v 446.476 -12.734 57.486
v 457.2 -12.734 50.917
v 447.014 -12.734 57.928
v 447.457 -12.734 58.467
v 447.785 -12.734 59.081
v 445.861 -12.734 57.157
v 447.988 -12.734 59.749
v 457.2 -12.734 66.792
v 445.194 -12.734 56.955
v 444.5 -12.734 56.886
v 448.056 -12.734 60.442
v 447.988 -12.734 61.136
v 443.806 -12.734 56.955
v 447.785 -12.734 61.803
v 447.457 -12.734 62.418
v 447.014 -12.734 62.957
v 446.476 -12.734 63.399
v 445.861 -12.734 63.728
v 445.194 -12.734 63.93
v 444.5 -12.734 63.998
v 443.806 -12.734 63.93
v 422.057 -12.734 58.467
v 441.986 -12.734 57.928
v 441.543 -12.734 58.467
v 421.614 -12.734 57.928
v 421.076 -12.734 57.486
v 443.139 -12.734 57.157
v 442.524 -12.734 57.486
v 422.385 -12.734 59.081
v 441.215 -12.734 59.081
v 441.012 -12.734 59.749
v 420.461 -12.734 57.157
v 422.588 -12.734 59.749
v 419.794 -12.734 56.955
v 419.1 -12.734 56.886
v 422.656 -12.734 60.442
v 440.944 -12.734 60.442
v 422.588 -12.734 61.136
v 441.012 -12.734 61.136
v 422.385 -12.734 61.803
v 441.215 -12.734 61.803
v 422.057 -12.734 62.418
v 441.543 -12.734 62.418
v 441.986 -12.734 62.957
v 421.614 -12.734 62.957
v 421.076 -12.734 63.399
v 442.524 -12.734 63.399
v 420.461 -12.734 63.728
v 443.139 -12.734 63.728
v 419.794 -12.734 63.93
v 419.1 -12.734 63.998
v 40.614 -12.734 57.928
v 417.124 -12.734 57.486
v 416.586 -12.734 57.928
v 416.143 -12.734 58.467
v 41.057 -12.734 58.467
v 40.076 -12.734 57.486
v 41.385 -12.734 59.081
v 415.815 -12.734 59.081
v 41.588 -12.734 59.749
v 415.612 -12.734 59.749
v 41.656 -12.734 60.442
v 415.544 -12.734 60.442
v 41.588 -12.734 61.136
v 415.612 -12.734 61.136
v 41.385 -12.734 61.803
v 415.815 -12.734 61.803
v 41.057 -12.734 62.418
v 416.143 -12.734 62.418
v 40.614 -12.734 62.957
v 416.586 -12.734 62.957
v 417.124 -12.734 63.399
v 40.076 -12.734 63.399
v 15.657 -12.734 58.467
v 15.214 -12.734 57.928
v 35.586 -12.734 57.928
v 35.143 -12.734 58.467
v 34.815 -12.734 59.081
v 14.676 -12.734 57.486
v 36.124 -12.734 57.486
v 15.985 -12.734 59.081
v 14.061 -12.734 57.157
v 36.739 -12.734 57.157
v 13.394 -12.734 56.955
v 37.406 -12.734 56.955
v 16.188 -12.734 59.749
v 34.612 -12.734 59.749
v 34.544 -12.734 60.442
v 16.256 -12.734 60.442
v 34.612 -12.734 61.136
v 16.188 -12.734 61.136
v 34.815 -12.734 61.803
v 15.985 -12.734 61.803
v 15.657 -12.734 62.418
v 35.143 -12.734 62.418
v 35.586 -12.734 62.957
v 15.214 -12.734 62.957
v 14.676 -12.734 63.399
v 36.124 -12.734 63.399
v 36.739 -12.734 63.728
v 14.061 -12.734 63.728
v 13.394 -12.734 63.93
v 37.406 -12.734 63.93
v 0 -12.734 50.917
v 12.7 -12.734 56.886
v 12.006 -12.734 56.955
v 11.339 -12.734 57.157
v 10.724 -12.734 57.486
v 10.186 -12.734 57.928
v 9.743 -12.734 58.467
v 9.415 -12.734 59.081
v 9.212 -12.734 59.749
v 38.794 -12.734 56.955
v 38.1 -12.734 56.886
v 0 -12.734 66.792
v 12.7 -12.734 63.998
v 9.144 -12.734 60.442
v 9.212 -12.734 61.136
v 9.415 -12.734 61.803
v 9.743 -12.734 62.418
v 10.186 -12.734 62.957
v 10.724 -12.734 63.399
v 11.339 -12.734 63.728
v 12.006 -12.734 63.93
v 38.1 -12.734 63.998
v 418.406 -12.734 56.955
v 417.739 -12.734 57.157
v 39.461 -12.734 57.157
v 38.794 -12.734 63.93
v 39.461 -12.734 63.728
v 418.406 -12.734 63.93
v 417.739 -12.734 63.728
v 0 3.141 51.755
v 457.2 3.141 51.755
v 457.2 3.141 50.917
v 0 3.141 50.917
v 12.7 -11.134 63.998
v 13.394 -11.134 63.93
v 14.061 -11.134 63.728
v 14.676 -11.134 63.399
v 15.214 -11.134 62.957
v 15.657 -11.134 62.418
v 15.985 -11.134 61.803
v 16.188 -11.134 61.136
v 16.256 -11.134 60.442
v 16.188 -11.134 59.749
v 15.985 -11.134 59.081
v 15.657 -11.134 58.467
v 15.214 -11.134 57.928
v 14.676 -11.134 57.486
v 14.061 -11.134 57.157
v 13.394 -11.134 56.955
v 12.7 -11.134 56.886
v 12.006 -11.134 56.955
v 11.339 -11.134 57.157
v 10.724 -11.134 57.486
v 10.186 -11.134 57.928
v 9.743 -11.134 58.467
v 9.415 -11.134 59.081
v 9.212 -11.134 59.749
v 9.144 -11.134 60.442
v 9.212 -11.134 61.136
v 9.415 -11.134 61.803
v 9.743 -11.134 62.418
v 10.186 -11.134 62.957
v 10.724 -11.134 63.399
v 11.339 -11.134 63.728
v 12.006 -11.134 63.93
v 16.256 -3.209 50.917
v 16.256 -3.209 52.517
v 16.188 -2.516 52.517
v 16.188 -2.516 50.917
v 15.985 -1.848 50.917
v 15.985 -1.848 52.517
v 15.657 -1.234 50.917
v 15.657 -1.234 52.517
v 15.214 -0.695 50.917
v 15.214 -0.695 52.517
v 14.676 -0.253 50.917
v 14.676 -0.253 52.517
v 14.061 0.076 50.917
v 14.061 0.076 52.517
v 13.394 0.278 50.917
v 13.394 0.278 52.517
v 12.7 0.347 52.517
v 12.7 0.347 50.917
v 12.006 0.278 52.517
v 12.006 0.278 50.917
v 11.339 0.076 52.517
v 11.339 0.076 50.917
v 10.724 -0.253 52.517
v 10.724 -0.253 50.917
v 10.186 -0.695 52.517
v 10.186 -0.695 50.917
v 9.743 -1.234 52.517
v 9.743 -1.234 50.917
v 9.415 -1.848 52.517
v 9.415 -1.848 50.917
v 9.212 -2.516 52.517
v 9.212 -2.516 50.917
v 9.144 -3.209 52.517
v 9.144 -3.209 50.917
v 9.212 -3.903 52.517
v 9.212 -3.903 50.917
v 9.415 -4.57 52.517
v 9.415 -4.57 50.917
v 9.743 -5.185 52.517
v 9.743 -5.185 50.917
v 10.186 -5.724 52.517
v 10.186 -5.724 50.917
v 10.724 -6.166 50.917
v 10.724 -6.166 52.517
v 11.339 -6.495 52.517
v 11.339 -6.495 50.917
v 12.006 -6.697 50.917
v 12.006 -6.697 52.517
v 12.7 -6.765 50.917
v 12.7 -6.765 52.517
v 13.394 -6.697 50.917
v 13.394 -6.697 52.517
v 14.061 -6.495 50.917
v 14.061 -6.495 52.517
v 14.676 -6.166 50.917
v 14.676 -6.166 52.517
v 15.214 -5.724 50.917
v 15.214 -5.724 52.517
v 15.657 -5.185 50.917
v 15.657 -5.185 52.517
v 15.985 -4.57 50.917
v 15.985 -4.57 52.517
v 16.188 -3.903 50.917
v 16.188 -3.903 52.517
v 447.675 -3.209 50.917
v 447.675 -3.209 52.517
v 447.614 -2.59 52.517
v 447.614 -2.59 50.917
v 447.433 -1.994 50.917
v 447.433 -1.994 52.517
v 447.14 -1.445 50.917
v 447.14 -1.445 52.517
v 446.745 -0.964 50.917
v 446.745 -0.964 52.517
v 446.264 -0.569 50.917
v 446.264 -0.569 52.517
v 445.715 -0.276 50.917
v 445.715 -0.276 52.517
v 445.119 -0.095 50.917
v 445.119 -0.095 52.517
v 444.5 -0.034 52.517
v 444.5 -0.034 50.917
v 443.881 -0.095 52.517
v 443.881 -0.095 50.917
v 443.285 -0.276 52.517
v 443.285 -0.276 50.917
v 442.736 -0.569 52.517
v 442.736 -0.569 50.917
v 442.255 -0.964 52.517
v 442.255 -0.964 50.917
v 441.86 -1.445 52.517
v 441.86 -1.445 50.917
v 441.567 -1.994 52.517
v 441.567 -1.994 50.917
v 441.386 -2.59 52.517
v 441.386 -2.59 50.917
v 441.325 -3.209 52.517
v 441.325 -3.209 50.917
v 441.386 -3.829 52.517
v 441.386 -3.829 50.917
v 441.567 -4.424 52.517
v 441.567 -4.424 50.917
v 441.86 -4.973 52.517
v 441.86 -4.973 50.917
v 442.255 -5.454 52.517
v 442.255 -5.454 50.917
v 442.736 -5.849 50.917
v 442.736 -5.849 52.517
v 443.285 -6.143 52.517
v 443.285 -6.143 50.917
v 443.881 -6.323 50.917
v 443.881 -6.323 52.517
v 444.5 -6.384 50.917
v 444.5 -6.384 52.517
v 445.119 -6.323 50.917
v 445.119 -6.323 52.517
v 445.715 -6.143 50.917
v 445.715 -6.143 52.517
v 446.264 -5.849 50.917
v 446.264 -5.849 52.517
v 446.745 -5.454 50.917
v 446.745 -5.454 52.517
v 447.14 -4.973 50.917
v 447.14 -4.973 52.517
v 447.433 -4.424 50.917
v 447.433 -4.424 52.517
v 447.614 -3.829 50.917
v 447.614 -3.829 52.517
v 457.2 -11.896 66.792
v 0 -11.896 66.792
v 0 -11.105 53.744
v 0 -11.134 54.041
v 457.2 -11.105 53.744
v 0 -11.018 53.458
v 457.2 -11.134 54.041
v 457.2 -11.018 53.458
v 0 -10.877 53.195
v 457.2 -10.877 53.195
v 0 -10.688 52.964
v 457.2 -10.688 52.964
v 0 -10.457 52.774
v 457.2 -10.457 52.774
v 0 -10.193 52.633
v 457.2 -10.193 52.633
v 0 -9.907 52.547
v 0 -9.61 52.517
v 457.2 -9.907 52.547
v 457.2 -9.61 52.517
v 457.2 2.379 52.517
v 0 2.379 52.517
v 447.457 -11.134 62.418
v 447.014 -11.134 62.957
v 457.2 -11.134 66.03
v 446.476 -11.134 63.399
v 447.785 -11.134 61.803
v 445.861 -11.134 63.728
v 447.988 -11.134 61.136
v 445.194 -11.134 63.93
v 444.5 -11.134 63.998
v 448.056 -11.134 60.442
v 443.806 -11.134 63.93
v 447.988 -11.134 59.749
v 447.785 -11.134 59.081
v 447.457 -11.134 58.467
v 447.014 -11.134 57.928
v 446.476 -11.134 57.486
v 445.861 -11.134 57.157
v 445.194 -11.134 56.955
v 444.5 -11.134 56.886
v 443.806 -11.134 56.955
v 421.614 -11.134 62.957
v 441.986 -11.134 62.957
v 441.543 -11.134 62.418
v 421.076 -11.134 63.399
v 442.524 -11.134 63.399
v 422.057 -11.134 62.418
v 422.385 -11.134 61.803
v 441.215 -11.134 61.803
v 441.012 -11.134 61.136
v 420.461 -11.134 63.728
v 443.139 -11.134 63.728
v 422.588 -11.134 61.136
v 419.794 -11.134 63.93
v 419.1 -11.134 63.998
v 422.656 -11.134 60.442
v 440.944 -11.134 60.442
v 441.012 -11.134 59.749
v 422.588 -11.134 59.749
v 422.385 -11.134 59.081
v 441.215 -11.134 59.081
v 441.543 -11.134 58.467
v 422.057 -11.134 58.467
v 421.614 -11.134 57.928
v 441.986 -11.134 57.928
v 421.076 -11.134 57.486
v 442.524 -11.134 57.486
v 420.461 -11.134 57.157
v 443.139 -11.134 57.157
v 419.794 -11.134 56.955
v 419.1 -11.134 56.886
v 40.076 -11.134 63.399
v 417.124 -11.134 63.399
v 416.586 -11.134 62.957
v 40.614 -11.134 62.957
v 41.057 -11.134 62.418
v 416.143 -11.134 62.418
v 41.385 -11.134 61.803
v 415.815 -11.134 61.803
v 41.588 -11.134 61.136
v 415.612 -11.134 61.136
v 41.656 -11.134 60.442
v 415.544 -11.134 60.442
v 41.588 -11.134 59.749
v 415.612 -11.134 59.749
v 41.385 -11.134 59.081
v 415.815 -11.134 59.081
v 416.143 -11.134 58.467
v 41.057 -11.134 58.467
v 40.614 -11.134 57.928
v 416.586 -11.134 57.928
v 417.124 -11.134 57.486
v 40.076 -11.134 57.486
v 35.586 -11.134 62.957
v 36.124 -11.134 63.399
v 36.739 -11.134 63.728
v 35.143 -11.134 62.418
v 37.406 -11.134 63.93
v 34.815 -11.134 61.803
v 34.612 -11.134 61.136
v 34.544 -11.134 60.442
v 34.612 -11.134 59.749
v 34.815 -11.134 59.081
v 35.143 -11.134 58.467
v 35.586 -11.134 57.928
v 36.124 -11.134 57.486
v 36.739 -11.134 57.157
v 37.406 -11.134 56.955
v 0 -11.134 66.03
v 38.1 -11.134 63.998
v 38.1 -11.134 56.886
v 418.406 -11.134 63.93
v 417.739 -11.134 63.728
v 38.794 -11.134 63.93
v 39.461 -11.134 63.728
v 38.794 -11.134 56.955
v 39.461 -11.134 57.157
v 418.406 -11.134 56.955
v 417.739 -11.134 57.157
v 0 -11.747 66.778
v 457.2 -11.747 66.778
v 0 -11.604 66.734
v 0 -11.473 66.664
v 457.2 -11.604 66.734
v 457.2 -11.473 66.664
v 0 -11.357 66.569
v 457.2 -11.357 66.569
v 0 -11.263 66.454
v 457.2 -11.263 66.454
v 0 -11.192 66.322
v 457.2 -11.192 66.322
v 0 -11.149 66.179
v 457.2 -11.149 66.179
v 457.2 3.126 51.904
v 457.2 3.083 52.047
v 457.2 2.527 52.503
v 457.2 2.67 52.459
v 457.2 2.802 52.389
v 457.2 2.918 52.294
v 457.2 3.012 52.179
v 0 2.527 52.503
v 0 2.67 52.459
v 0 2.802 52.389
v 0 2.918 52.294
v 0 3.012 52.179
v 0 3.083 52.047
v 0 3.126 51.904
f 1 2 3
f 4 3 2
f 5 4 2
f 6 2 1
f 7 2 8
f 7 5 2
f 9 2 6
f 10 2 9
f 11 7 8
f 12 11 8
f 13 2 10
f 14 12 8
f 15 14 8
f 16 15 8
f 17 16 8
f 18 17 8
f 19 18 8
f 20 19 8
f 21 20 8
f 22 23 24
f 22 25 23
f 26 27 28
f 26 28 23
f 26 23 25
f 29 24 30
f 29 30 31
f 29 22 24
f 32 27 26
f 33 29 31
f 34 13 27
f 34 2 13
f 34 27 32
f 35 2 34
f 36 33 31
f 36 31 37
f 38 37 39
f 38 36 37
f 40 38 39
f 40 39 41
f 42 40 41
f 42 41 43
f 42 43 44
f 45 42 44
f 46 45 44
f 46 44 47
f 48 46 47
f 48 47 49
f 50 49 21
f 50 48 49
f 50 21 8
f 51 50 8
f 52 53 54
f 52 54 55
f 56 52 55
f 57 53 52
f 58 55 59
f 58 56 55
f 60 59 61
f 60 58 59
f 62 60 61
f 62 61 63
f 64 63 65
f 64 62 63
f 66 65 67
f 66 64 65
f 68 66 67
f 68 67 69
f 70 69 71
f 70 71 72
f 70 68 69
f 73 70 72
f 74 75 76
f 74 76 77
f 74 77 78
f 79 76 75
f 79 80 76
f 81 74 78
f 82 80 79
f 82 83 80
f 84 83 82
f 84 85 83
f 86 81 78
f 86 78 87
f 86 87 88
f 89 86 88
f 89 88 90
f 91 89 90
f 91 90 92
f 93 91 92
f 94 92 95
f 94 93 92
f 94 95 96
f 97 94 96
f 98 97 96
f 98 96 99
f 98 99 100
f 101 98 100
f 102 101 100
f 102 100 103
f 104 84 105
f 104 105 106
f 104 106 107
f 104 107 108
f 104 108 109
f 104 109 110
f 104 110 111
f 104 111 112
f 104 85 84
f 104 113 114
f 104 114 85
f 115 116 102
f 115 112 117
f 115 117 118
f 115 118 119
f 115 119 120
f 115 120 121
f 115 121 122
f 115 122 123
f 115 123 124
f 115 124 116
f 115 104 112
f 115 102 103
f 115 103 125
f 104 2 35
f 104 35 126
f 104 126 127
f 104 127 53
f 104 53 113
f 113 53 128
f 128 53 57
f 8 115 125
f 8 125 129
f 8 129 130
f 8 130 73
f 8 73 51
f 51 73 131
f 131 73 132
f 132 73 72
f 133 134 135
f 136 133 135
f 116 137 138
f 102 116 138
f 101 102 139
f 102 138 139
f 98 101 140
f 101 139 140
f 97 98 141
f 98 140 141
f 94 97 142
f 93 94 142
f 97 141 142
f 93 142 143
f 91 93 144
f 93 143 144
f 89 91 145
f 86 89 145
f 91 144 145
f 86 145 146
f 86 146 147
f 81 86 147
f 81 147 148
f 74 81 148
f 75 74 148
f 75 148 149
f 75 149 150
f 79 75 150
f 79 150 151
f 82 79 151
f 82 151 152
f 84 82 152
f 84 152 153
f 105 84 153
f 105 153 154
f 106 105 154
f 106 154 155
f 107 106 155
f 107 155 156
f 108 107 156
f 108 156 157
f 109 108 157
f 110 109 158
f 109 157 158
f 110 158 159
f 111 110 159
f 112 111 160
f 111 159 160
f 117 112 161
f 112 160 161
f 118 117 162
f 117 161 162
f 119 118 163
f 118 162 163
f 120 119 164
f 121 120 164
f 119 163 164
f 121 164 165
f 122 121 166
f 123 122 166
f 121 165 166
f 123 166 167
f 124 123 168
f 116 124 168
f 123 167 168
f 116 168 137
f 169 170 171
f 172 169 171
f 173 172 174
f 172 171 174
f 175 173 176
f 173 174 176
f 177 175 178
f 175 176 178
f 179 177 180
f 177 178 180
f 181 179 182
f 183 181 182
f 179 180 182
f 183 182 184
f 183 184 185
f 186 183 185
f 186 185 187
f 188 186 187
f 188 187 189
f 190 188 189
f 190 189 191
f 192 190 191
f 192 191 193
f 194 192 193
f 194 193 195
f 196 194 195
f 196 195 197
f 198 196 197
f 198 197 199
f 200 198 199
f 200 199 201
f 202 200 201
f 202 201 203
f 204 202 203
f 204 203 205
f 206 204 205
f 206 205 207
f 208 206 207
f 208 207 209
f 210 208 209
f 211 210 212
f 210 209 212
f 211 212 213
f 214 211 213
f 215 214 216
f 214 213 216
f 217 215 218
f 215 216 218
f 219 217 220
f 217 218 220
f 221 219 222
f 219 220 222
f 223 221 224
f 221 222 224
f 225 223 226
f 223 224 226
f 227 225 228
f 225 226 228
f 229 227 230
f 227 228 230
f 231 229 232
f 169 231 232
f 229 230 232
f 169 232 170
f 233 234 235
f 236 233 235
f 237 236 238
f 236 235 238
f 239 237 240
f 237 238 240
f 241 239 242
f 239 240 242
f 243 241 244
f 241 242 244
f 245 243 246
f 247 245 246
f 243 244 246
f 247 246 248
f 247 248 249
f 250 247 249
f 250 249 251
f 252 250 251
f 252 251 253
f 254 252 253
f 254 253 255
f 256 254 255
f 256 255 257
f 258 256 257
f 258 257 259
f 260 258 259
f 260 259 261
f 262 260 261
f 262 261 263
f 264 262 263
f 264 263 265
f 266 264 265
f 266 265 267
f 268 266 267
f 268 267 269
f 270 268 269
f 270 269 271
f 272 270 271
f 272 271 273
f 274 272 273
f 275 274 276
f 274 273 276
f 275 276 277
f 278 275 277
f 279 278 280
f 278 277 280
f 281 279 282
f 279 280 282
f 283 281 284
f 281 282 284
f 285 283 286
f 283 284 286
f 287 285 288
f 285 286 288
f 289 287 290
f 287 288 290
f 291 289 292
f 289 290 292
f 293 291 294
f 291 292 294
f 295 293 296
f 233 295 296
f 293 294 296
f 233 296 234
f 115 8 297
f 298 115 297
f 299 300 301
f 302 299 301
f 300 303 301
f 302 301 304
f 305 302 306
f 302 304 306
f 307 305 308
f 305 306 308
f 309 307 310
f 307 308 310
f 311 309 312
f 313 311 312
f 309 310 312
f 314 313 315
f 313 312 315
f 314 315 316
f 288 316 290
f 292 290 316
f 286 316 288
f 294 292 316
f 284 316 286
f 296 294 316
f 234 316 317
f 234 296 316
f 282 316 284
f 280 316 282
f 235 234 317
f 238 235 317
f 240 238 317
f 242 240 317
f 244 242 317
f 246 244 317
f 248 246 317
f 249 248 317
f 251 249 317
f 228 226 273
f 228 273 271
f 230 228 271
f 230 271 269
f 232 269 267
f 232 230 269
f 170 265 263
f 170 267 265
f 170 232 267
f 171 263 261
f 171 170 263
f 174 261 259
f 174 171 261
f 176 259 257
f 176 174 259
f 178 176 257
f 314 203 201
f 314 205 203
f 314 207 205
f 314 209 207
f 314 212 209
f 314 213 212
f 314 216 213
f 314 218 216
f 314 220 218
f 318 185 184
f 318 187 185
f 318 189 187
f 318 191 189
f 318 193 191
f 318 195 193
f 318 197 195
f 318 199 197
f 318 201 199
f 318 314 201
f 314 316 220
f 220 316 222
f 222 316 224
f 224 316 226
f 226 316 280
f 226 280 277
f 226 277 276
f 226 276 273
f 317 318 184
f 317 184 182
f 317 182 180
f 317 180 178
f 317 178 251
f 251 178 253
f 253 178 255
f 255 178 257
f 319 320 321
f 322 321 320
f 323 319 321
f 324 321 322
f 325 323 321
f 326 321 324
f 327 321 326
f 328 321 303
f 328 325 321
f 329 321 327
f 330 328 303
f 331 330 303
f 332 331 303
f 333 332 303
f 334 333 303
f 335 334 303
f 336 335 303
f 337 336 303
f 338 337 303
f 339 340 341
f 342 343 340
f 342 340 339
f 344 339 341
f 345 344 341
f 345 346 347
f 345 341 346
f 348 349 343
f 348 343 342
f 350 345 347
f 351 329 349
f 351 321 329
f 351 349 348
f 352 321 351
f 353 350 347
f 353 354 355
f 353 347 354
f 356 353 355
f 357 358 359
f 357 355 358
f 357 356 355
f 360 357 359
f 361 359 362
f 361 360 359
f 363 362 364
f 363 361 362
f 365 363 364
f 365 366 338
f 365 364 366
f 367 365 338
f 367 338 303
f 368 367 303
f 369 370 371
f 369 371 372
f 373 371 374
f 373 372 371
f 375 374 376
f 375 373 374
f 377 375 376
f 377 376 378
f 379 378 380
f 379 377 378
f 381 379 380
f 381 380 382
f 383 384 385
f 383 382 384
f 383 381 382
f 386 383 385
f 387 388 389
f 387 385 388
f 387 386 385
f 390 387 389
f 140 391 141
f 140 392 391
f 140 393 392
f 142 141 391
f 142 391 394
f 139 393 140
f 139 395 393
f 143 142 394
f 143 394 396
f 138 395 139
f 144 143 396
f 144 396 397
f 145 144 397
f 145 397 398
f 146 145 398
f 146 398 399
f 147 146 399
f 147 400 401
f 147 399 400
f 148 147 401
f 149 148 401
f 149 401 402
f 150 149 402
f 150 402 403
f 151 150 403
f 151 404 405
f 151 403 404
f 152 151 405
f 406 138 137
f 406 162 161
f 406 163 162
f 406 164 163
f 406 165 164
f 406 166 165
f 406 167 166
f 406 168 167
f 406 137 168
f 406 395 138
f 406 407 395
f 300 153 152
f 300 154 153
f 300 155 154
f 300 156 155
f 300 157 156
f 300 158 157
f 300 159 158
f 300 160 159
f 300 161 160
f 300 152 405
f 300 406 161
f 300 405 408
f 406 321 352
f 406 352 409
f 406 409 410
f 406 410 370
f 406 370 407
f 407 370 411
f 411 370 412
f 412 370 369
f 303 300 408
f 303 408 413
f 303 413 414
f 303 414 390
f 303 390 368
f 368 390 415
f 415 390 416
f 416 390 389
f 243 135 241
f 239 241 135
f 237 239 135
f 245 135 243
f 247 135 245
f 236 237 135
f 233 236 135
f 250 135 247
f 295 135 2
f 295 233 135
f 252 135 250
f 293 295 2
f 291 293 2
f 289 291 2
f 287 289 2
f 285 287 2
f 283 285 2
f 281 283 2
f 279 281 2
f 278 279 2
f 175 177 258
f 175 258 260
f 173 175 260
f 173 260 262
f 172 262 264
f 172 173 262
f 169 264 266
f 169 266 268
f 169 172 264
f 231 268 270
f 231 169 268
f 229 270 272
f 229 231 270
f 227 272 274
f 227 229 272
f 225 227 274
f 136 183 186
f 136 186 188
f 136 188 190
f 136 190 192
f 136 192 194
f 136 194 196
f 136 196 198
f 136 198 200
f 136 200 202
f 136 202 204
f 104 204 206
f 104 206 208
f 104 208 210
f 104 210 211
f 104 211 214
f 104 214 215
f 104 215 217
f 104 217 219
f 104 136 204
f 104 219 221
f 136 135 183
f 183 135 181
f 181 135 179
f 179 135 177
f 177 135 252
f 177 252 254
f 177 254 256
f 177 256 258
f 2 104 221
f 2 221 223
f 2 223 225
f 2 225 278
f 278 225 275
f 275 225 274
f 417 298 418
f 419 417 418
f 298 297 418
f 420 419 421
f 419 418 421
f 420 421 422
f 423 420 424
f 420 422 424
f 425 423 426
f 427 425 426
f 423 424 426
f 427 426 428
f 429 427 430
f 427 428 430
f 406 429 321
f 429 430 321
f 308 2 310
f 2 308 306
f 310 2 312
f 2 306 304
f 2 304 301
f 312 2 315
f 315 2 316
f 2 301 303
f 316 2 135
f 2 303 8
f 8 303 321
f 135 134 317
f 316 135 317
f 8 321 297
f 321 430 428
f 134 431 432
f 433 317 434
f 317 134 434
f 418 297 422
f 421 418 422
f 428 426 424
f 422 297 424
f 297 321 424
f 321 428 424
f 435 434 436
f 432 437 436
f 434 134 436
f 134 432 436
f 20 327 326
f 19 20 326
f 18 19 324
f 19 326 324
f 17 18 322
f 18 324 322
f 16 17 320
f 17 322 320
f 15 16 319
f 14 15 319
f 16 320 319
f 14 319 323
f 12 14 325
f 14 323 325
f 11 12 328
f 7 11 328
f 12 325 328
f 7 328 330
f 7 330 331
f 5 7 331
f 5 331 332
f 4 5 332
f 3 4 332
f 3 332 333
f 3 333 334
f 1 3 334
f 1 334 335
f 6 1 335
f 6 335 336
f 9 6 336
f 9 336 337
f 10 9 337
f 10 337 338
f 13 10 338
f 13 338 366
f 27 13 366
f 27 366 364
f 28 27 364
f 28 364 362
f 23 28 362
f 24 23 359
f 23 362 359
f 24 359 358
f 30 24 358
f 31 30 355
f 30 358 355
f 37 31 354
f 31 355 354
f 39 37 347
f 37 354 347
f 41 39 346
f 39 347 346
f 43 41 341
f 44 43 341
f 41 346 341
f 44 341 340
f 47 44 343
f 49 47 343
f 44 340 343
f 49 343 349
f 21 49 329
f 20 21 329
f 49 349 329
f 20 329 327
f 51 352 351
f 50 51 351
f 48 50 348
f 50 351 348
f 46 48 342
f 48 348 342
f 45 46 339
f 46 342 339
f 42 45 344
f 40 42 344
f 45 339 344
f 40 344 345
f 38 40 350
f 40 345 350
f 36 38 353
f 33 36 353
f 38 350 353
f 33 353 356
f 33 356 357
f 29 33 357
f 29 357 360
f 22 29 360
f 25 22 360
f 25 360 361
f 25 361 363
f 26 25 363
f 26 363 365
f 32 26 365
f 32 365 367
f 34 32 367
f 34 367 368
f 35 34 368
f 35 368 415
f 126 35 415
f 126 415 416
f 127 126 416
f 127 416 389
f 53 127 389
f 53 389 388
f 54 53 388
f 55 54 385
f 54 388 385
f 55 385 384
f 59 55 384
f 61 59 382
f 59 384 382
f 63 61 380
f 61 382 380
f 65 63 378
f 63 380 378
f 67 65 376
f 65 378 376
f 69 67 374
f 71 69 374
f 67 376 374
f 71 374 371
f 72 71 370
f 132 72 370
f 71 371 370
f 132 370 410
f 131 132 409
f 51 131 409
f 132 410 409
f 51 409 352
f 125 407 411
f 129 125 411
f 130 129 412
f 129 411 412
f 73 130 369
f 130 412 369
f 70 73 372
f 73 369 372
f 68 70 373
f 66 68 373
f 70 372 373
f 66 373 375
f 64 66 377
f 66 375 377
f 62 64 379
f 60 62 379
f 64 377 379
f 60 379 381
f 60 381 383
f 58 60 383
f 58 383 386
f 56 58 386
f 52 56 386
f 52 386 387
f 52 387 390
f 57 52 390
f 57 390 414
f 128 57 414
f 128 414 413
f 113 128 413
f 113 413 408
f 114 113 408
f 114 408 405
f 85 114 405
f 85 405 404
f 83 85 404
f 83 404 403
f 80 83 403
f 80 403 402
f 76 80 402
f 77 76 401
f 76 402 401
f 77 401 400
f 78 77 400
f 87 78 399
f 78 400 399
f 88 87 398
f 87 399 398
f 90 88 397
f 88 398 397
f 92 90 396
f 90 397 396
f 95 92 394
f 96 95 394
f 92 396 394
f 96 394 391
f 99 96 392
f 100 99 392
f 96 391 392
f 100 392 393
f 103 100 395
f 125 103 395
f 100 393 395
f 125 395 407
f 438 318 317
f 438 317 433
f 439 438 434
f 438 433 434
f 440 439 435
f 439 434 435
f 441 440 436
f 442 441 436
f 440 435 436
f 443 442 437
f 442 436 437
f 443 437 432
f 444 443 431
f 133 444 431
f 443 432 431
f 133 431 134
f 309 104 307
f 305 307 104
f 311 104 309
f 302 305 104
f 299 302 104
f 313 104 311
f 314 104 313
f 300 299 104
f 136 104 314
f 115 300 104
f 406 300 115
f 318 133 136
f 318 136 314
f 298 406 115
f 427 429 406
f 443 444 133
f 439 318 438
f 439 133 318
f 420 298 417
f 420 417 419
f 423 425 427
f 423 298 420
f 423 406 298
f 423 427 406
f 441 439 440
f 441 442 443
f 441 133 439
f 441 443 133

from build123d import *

# Parameters (mm, degrees)
BOSS_EXTRUDE1_DEPTH = 457.2
FILLET1_R           = 0.762
FILLET2_R           = 1.524
SKETCH2_R           = 3.556
CUT_EXTRUDE1_DEPTH  = 463.273528266
SKETCH3_R           = 3.556
SKETCH3_R_2         = 3.175
CUT_EXTRUDE2_DEPTH  = 458.600012933


with BuildPart() as part:
    # Sketch1 → Boss-Extrude1 (new body)
    with BuildSketch(Plane(origin=(0, 0, 0), x_dir=(0, 0, -1), z_dir=(1, 0, 0))):
        Polygon((-50.917252699, 3.14071867), (-50.917252699, -12.73428133), (-66.792252699, -12.73428133), (-66.792252699, -11.13408133), (-52.517452699, -11.13408133), (-52.517452699, 3.14071867), align=None)
    extrude(amount=BOSS_EXTRUDE1_DEPTH)

    # Fillet1
    fillet1_edges = [part.edges().sort_by_distance(p)[0] for p in [
        (228.6, -11.13408133, 66.792252699),
        (228.6, 3.14071867, 52.517452699),
    ]]
    fillet(fillet1_edges, radius=FILLET1_R)

    # Fillet2
    fillet2_edges = [part.edges().sort_by_distance(p)[0] for p in [
        (228.6, -11.13408133, 52.517452699),
    ]]
    fillet(fillet2_edges, radius=FILLET2_R)

    # Sketch2 → Cut-Extrude1 (cut, through all)
    with BuildSketch(Plane(origin=(0, -11.13408133, 0), x_dir=(1, 0, 0), z_dir=(0, 1, 0))):
        with Locations(Location((444.5, -60.442252699, 0), (0, 0, 270))):
            Circle(SKETCH2_R)
        with Locations(Location((419.1, -60.442252699, 0), (0, 0, 270))):
            Circle(SKETCH2_R)
        with Locations(Location((12.7, -60.442252699, 0), (0, 0, 270))):
            Circle(SKETCH2_R)
        with Locations(Location((38.1, -60.442252699, 0), (0, 0, 270))):
            Circle(SKETCH2_R)
    extrude(amount=-CUT_EXTRUDE1_DEPTH, mode=Mode.SUBTRACT)

    # Sketch3 → Cut-Extrude2 (cut, through all)
    with BuildSketch(Plane.XY.offset(52.517452699)):
        with Locations((12.7, -3.20928133)):
            Circle(SKETCH3_R)
        with Locations((444.5, -3.20928133)):
            Circle(SKETCH3_R_2)
    extrude(amount=-CUT_EXTRUDE2_DEPTH, mode=Mode.SUBTRACT)


solid = part.part
